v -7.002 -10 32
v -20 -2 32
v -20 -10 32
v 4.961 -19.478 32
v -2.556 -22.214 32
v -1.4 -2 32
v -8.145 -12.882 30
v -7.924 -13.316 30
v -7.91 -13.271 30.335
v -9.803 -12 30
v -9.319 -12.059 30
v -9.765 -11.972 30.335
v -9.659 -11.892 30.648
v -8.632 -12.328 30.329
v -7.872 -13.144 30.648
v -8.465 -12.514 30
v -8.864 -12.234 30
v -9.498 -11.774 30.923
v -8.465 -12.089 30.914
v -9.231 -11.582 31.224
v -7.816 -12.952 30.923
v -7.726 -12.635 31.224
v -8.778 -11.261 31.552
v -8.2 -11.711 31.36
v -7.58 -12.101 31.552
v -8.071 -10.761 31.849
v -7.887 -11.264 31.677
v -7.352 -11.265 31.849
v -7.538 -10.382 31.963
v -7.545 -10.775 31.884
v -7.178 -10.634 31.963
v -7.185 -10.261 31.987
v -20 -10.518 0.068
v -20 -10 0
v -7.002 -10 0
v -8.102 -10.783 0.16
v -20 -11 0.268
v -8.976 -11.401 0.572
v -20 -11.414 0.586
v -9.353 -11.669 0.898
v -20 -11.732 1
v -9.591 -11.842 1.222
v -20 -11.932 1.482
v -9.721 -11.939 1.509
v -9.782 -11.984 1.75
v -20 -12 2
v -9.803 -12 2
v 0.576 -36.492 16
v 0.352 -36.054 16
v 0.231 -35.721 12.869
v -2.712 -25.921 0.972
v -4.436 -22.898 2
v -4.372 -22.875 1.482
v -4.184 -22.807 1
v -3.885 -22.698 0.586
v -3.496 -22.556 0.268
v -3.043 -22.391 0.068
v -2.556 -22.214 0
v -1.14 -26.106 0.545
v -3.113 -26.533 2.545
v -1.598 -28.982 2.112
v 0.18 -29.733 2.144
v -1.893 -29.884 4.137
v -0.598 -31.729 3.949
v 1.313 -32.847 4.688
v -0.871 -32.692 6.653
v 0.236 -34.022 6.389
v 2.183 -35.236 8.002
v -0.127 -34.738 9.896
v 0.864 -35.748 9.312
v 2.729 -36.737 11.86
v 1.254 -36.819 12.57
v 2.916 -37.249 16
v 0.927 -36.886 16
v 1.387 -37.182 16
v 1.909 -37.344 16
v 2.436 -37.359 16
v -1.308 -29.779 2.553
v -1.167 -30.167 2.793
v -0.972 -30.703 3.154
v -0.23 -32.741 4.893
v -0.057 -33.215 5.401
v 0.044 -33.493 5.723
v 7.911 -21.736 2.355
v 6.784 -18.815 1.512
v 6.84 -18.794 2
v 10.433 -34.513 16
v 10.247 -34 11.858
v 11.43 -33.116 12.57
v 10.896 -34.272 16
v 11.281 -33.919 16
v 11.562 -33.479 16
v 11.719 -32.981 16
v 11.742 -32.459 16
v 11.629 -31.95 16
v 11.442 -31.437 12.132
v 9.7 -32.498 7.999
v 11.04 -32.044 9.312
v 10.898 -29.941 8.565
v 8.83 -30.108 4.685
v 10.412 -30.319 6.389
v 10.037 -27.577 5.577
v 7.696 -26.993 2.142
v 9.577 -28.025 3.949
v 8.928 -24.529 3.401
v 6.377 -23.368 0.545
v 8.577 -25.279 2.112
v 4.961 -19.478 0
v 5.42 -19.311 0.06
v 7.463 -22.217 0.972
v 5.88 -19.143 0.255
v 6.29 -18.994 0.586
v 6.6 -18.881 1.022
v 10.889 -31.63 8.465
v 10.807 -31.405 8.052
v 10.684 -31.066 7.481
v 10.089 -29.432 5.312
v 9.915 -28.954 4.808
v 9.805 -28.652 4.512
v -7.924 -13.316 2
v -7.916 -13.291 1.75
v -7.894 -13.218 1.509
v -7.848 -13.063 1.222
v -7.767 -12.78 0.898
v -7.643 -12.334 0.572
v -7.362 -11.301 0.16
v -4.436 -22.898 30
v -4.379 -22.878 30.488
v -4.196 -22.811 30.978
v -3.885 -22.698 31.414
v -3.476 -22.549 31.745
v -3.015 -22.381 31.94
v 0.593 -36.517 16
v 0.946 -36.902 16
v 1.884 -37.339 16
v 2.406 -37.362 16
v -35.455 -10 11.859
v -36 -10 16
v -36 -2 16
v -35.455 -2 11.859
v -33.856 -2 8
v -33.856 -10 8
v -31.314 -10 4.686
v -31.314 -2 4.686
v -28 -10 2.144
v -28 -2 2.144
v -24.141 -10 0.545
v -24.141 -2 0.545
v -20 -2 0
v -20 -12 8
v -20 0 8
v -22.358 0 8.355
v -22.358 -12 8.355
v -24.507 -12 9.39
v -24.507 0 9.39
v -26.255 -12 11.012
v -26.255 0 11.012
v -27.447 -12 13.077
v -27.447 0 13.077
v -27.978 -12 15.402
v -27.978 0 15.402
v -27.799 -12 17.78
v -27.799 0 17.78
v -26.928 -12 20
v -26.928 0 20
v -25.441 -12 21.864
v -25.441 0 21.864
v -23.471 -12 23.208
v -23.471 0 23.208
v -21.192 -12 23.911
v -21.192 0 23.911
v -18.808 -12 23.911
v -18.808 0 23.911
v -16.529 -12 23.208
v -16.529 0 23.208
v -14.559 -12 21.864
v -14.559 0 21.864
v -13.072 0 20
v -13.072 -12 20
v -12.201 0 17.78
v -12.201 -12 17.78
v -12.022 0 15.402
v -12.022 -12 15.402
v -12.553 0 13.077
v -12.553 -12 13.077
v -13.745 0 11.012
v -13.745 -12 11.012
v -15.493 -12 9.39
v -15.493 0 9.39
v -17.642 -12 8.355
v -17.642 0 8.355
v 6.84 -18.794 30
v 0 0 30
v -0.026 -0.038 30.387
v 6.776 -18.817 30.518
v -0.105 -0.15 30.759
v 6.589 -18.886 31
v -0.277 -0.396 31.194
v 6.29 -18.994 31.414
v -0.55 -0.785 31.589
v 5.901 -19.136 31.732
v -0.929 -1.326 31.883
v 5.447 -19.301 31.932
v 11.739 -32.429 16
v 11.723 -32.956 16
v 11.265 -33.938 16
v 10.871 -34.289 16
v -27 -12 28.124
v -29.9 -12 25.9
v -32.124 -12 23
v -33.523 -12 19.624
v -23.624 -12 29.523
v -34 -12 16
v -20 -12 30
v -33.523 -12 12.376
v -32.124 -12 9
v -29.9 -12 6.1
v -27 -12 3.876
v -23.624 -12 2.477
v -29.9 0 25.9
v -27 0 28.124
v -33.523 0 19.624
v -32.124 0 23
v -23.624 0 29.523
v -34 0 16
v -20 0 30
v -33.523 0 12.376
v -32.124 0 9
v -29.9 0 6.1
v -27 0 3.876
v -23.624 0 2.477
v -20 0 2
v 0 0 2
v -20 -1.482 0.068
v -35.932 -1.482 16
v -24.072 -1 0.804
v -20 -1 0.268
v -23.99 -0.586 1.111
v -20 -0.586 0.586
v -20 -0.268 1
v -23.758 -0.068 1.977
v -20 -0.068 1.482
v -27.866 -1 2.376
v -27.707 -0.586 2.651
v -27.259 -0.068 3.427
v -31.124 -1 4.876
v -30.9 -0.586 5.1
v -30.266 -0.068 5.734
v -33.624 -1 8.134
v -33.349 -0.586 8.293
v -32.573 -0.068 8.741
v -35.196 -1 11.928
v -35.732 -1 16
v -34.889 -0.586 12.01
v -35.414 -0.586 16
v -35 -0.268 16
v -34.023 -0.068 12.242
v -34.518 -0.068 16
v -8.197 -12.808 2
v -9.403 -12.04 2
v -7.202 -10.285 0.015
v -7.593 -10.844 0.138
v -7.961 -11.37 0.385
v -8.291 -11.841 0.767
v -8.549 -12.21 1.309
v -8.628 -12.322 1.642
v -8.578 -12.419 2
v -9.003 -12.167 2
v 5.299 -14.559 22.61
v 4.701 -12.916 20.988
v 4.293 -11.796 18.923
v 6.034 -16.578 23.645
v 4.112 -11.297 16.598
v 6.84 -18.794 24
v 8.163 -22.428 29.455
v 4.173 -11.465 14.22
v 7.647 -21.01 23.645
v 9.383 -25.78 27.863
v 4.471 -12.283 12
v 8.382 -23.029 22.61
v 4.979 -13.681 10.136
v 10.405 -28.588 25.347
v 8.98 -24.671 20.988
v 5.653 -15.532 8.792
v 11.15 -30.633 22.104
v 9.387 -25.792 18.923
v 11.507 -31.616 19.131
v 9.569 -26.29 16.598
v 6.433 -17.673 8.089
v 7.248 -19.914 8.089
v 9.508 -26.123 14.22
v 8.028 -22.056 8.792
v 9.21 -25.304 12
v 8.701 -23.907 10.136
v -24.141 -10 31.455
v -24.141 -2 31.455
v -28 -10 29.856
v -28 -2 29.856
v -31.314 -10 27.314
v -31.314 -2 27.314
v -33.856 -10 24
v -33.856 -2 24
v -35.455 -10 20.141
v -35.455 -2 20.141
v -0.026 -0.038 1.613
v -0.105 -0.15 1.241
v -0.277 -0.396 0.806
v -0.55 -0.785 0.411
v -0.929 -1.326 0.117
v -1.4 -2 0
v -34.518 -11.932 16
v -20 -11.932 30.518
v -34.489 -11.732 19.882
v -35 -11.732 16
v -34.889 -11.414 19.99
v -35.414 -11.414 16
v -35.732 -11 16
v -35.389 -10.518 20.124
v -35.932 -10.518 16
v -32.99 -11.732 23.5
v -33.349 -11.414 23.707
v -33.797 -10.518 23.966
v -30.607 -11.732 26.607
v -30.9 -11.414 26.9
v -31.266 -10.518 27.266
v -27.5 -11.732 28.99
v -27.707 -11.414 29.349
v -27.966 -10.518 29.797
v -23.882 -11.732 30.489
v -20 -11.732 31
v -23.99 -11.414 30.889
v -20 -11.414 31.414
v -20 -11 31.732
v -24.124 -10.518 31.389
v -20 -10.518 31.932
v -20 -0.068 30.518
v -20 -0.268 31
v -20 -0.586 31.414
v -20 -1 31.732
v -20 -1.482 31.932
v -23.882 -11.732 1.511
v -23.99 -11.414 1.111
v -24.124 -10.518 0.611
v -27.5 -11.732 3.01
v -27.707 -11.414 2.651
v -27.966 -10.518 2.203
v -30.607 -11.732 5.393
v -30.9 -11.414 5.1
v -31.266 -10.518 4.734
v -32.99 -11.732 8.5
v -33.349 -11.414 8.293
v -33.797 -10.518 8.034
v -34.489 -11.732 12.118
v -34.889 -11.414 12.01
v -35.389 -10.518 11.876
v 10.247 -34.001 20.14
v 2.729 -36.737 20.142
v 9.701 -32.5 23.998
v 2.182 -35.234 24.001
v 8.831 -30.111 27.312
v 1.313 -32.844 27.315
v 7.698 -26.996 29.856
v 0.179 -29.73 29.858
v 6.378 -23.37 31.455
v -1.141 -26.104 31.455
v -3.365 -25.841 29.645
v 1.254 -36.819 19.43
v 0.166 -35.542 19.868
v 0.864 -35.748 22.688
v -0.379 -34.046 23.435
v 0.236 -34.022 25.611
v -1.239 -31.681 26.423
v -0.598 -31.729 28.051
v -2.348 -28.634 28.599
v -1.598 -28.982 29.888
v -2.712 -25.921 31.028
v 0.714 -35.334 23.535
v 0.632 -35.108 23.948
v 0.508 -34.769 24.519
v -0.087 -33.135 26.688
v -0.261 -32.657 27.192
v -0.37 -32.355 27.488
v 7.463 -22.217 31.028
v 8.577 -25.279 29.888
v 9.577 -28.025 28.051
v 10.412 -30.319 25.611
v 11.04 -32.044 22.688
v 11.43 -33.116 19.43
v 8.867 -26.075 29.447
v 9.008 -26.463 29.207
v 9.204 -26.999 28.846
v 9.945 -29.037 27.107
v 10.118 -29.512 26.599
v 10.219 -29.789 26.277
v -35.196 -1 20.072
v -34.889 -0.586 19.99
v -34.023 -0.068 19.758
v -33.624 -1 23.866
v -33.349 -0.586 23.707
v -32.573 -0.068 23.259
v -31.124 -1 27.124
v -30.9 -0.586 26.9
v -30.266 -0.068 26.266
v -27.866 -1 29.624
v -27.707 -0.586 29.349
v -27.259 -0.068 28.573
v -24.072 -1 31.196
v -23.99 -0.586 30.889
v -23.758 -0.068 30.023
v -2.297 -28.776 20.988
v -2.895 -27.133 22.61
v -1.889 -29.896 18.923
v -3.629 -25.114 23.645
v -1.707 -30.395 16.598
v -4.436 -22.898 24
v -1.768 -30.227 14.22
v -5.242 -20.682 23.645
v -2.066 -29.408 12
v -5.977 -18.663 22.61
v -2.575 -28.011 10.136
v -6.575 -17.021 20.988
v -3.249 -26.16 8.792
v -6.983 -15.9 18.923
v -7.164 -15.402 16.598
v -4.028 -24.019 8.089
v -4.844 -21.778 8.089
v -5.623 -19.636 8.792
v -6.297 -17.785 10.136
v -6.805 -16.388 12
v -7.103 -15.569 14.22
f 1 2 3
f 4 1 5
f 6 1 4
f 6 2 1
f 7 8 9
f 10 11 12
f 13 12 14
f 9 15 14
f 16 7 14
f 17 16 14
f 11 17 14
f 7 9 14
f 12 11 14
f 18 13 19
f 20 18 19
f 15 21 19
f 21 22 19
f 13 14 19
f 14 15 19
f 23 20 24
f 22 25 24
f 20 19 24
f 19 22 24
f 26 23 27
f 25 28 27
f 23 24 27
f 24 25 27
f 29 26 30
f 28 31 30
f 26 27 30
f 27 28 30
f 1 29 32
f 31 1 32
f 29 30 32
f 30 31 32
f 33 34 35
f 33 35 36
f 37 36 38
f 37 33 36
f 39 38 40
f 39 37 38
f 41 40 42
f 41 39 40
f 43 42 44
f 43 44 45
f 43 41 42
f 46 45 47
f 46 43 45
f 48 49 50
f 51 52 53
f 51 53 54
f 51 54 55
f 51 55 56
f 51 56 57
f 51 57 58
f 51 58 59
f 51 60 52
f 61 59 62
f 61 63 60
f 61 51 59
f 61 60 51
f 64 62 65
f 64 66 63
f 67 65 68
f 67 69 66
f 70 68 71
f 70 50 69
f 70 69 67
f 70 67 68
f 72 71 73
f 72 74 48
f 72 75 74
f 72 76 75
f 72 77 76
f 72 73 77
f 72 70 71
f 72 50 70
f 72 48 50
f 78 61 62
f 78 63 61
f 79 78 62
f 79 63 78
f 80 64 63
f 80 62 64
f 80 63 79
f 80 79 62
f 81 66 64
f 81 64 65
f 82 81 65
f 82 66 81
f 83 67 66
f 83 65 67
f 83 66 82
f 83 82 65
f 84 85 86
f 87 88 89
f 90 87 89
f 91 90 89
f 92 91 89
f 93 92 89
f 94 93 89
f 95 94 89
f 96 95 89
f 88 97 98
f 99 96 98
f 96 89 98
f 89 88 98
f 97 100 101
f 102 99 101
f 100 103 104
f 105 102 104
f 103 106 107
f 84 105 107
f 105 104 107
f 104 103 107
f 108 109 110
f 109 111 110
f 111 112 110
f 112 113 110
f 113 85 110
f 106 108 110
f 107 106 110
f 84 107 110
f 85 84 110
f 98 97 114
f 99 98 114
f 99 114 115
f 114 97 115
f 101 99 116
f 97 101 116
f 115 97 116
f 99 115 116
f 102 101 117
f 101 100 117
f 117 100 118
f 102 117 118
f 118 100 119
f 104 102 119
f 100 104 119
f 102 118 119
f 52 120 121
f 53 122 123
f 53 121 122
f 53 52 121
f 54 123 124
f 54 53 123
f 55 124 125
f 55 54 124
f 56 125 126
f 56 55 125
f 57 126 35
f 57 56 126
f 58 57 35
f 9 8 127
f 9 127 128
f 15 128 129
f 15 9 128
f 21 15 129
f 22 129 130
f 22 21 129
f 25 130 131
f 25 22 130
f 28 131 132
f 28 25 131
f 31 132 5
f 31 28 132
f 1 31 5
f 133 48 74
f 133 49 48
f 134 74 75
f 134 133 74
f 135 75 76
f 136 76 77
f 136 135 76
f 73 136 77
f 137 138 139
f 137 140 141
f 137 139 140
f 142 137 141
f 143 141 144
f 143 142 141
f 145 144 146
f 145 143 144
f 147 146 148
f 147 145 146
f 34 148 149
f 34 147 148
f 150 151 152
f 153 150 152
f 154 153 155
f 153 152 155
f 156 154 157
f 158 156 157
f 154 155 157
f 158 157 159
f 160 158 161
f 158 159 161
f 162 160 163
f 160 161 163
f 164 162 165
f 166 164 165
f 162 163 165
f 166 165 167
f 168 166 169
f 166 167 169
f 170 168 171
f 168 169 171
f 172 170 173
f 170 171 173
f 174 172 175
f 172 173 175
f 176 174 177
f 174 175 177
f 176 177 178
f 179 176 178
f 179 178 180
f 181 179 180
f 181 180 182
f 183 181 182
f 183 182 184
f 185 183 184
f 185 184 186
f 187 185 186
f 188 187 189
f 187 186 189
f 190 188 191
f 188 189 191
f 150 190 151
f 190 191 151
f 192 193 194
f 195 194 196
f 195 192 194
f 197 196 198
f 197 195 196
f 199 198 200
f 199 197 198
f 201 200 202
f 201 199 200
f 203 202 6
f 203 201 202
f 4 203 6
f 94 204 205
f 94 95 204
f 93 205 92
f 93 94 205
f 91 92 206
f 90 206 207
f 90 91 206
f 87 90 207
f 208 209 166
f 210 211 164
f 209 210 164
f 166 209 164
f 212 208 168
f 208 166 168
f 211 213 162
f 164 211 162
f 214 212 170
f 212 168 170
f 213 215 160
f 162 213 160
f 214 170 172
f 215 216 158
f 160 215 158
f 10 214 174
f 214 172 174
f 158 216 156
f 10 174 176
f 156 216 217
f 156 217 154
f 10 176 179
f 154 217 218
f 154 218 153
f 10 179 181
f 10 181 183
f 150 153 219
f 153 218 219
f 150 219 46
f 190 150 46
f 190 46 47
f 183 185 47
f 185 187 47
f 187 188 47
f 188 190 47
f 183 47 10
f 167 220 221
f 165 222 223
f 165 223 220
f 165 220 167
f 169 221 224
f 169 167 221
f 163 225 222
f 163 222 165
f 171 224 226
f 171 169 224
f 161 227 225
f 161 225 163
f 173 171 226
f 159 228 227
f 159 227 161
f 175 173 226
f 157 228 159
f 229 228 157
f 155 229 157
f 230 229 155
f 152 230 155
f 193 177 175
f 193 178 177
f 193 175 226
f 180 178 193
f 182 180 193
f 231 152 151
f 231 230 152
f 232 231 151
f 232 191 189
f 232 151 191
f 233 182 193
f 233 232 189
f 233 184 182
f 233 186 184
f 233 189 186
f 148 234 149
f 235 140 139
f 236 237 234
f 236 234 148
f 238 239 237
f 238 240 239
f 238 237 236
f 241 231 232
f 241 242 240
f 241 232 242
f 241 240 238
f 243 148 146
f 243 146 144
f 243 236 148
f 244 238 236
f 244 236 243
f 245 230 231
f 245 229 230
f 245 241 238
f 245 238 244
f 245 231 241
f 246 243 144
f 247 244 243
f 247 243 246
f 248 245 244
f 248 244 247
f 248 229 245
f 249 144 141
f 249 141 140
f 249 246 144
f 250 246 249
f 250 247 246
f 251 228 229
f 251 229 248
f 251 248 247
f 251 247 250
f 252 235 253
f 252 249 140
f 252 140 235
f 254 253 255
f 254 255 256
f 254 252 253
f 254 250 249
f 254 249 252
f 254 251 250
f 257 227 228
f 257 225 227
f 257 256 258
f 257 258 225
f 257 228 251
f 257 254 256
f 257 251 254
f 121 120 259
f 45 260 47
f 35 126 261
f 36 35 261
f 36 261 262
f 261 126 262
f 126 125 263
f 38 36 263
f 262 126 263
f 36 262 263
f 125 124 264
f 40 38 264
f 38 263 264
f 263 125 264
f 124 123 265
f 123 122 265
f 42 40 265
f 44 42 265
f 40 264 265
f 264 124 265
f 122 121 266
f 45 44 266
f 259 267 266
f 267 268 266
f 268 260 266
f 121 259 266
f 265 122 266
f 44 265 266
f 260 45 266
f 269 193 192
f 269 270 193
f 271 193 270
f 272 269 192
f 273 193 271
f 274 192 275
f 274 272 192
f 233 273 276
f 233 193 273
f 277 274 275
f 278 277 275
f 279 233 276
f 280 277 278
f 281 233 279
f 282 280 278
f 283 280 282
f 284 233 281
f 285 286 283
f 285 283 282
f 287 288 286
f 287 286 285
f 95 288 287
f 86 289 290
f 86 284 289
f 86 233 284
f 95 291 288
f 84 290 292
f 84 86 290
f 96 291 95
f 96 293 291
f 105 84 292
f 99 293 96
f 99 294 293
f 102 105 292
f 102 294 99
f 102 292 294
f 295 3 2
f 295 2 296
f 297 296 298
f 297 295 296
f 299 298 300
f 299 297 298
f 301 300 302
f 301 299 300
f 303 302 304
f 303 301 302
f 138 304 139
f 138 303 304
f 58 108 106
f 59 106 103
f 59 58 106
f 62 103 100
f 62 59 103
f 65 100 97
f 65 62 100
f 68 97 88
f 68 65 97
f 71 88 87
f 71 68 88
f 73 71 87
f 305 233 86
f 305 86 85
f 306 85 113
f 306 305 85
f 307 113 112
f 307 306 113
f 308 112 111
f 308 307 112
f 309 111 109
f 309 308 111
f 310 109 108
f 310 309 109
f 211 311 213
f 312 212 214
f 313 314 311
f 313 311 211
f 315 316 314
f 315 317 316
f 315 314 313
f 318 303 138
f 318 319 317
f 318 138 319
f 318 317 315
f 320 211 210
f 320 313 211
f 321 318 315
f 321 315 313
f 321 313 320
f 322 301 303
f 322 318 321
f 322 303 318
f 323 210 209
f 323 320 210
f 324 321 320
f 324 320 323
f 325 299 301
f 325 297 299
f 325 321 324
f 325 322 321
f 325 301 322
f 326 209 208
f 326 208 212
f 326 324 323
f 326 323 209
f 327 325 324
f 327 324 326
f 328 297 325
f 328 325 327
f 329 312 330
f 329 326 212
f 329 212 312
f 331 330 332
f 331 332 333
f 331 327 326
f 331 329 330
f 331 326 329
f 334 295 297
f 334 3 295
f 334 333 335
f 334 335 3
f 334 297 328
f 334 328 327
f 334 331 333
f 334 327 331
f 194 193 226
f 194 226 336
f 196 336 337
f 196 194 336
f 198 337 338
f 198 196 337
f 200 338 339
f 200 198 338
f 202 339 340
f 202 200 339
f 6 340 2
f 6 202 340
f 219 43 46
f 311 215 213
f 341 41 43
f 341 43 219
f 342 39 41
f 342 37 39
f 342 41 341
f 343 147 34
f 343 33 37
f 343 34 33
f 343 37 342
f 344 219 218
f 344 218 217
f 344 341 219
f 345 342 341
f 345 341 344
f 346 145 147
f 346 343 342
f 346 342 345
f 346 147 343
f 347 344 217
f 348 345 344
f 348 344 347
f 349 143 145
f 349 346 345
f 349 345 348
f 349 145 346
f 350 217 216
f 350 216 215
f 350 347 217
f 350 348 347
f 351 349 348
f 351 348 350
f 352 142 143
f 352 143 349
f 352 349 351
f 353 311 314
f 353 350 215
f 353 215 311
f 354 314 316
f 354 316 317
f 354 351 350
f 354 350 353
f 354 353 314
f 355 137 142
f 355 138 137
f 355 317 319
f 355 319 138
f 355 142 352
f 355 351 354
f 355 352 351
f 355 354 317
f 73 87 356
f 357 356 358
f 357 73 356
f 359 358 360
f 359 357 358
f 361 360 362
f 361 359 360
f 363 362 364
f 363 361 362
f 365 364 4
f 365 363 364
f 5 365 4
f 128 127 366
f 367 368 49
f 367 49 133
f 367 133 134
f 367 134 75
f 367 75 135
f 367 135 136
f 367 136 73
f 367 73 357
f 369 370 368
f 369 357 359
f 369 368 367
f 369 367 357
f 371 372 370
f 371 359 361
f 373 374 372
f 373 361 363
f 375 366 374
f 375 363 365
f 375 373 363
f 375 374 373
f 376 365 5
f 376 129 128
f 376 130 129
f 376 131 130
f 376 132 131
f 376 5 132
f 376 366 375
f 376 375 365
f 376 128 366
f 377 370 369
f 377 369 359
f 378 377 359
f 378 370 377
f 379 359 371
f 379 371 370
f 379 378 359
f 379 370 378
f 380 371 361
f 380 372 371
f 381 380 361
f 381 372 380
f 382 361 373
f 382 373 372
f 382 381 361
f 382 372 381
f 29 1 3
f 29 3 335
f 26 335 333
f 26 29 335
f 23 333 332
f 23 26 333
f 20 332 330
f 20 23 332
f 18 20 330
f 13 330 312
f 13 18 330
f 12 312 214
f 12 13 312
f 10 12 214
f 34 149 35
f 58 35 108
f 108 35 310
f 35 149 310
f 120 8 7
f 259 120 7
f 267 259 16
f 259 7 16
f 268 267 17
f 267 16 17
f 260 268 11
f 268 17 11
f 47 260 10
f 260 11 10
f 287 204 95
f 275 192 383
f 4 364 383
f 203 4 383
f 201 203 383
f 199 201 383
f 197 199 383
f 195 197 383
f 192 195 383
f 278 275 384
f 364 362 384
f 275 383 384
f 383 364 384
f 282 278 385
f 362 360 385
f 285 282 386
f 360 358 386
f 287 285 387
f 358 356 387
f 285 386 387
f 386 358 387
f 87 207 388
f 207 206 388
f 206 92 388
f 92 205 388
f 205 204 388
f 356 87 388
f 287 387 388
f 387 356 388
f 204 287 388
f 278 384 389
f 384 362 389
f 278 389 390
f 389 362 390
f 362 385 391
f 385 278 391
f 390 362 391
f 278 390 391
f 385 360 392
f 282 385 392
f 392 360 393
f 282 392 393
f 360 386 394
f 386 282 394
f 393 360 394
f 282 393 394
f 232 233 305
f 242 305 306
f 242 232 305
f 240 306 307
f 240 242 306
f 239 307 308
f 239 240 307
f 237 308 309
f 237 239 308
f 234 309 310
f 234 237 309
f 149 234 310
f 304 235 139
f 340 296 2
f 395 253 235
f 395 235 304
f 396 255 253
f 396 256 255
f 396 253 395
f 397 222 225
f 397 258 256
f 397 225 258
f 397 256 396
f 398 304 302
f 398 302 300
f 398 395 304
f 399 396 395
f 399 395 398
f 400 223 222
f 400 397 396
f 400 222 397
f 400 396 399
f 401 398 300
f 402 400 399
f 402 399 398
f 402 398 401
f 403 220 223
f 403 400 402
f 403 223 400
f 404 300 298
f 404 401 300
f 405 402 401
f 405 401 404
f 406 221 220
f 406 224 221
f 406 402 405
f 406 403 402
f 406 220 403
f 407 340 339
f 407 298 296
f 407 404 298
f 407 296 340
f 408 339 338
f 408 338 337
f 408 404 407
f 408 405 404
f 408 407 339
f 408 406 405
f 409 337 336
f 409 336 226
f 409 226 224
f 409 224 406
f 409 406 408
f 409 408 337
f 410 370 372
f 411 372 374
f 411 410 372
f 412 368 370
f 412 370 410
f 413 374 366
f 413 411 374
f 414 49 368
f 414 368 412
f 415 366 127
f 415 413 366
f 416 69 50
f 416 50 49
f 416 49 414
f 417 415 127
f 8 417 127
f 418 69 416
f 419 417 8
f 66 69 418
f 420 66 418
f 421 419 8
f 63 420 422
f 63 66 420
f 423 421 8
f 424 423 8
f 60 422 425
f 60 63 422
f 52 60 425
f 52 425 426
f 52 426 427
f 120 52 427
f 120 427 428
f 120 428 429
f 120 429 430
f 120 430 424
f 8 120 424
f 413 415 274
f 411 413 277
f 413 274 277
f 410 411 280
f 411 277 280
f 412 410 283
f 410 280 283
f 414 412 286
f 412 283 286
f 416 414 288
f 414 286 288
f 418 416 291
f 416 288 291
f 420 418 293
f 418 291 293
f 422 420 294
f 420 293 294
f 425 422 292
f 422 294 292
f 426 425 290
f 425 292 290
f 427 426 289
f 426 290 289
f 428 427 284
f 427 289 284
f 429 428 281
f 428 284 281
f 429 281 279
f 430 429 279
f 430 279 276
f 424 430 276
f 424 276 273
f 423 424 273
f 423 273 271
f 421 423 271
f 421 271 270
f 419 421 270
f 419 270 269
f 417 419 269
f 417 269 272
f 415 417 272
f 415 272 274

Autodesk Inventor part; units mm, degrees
ref_plane "YZ Plane" through (0, 0, 0) normal (1, 0, 0) x (0, 1, 0)
ref_plane "XZ Plane" through (0, 0, 0) normal (0, 1, 0) x (-1, 0, 0)
ref_plane "XY Plane" through (0, 0, 0) normal (0, 0, 1) x (1, 0, 0)
sketch "Sketch1" plane through (0, 0, 0) normal (0, 0, 1) x (1, 0, 0)
  line L0 (0, -45.5198) -> (0, 7.5866) projected
  line L1 (-45.6625, 0) -> (21.9753, 0) projected
  line L2 (0, 0) -> (-36, 0)
  line L3 (-36, 0) -> (-36, -12)
  line L4 (-36, -12) -> (-8.4025, -12)
  line L5 (-8.4025, -12) -> (0, 0) construction
  line L6 (0, 0) -> (12.3127, -33.8289)
  line L7 (12.3127, -33.8289) -> (1.0364, -37.9332)
  line L8 (1.0364, -37.9332) -> (-8.4025, -12)
  dimension "d0" = 36
  dimension "d1" = 12
  dimension "d2" = 55
extrude "Extrusion1" add sketch "Sketch1" along normal blind 32
fillet "Fillet1" radius 16 4 edges at (-36, -6, 32) (6.6746, -35.8811, 32) (6.6746, -35.8811, 0) (-36, -6, 0)
hole "Hole1" at (-20, -12, 16) direction (0, 1, 0) diameter 16 end through all
hole "Hole2" at (-4.4359, -22.8981, 16) direction (0.9396926, 0.3420201, 0) diameter 16 end through all
fillet "Fillet2" radius 2 12 edges at (3.4202, -9.397, 32) (10.7099, -29.4253, 27.3137) (3.4202, -9.397, 0) (-6.4192, -17.4491, 32) (-0.5664, -33.5295, 27.3137) (-6.4192, -17.4491, 0) (-14.2013, -12, 32) (-31.3137, -12, 27.3137) (-14.2013, -12, 0) (-10.0001, 0, 32) (-31.3137, 0, 27.3137) (-10.0001, 0, 0)
fillet "Fillet3" radius 2 3 edges at (-8.4025, -12, 16) (-7.9923, -11.4142, 31.4142) (-7.9923, -11.4142, 0.5858)
properties part number "Levier"
